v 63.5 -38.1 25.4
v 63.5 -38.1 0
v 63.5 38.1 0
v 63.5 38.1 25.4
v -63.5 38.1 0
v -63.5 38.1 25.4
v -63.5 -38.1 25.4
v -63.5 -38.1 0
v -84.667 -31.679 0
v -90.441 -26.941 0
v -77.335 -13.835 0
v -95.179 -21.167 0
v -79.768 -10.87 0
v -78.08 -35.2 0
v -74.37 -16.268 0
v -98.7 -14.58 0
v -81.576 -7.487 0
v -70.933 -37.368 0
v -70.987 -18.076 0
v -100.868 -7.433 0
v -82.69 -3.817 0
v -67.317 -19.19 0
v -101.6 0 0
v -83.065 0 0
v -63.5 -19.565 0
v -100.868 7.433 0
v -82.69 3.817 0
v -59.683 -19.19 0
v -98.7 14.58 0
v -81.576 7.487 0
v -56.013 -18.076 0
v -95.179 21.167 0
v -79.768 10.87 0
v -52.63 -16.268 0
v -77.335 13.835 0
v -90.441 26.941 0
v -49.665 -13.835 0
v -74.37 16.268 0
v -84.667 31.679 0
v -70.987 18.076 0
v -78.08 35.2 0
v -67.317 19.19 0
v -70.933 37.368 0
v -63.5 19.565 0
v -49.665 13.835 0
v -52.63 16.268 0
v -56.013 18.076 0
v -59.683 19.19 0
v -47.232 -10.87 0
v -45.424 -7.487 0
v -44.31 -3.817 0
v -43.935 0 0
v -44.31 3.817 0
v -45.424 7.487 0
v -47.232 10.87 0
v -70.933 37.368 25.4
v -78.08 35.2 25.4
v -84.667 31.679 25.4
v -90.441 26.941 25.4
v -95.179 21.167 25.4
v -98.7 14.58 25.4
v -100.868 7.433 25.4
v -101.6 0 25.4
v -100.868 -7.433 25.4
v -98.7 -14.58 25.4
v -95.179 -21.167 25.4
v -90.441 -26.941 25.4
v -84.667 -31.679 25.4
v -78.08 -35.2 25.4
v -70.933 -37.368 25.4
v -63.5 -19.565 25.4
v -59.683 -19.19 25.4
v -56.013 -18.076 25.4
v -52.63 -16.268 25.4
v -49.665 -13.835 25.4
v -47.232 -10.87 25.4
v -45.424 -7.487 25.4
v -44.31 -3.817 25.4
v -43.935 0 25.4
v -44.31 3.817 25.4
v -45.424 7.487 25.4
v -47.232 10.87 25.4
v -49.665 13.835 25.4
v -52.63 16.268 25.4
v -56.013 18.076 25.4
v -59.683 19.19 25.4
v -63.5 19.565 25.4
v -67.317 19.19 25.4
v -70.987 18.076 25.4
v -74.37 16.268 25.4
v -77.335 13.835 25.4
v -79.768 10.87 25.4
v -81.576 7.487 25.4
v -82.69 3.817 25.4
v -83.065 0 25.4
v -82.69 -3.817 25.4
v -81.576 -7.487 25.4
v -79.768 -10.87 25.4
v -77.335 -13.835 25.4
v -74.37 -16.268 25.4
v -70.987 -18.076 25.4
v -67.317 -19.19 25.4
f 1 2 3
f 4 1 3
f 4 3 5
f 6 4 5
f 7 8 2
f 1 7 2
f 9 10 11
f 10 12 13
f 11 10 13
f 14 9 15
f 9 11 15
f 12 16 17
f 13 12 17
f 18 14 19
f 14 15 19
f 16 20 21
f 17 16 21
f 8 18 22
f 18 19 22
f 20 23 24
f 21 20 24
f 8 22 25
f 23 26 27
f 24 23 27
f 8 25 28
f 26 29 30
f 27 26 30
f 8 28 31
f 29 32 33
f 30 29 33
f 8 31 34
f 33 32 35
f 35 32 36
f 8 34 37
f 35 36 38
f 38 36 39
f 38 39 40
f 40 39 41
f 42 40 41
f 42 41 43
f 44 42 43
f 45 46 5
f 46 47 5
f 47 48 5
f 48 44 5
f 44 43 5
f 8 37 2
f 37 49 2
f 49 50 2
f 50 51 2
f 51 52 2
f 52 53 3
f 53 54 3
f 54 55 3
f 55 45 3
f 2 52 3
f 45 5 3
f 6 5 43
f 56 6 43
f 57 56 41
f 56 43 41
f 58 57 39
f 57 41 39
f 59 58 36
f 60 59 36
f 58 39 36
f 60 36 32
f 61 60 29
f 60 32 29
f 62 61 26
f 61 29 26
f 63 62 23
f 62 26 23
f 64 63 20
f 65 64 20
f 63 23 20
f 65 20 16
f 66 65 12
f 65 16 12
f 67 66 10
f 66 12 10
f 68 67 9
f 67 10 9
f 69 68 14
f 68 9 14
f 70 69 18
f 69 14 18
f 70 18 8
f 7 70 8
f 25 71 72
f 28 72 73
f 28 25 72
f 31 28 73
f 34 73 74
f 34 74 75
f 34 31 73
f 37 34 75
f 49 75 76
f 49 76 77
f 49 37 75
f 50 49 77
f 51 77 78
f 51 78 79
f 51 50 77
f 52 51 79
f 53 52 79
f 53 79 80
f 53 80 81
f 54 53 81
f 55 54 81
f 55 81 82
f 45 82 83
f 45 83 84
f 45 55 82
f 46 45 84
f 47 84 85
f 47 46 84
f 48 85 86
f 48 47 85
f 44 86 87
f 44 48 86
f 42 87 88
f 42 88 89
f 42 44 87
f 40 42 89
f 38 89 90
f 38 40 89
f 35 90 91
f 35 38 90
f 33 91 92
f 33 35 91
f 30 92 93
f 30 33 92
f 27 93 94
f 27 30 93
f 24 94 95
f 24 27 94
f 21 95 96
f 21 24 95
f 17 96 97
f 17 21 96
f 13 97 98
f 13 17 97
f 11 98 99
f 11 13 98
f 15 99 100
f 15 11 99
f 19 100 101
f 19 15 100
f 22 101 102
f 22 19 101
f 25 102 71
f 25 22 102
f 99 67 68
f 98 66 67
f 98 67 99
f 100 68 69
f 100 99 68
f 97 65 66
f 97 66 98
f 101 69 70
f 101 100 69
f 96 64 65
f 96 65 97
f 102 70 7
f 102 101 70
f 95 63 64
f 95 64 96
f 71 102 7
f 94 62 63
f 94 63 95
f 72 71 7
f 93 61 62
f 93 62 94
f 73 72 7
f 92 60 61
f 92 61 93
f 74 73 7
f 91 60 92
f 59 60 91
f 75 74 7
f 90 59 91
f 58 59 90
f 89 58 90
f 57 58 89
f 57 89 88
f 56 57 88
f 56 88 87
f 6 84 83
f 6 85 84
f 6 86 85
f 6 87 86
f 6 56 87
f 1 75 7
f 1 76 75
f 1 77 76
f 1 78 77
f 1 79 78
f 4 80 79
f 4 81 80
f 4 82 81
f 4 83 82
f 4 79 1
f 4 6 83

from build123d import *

# Parameters (mm, degrees)
F1_DEPTH = 25.4
F2_DEPTH = 25.4
F3_DEPTH = 25.4


with BuildPart() as f1:
    # F0 (on Top) → F1 (new body)
    with BuildSketch(Plane.XY):
        with BuildLine():
            Line((-63.5, 19.565446079), (-63.5, -19.565446079))
            ThreePointArc((-63.5, -19.565446079), (-49.6651404006, -13.8348595994), (-43.934553921, 0))
            ThreePointArc((-43.934553921, 0), (-49.6651404006, 13.8348595994), (-63.5, 19.565446079))
        make_face()
        with BuildLine():
            ThreePointArc((-63.5, 19.565446079), (-83.065446079, 0), (-63.5, -19.565446079))
            Line((-63.5, -19.565446079), (-63.5, 19.565446079))
        make_face()
    extrude(amount=F1_DEPTH)

    # F0 (on Top) → F2 (join)
    with BuildSketch(Plane.XY):
        with BuildLine():
            Line((-63.5, -38.1), (63.5, -38.1))
            Line((63.5, -38.1), (63.5, 38.1))
            Line((63.5, 38.1), (-63.5, 38.1))
            ThreePointArc((-63.5, 38.1), (-36.5592316368, 26.9407683632), (-25.4, 0))
            ThreePointArc((-25.4, 0), (-36.5592316368, -26.9407683632), (-63.5, -38.1))
        make_face()
        with BuildLine():
            ThreePointArc((-63.5, 38.1), (-101.6, 0), (-63.5, -38.1))
            Line((-63.5, -38.1), (-63.5, -19.565446079))
            ThreePointArc((-63.5, -19.565446079), (-83.065446079, 0), (-63.5, 19.565446079))
            Line((-63.5, 19.565446079), (-63.5, 38.1))
        make_face()
        with BuildLine():
            Line((-63.5, -19.565446079), (-63.5, -38.1))
            ThreePointArc((-63.5, -38.1), (-36.5592316368, -26.9407683632), (-25.4, 0))
            ThreePointArc((-25.4, 0), (-36.5592316368, 26.9407683632), (-63.5, 38.1))
            Line((-63.5, 38.1), (-63.5, 19.565446079))
            ThreePointArc((-63.5, 19.565446079), (-49.6651404006, 13.8348595994), (-43.934553921, 0))
            ThreePointArc((-43.934553921, 0), (-49.6651404006, -13.8348595994), (-63.5, -19.565446079))
        make_face()
    extrude(amount=F2_DEPTH)

    # F0 (on Top) → F3 (cut)
    with BuildSketch(Plane.XY):
        with BuildLine():
            ThreePointArc((-63.5, 19.565446079), (-83.065446079, 0), (-63.5, -19.565446079))
            Line((-63.5, -19.565446079), (-63.5, 19.565446079))
        make_face()
        with BuildLine():
            Line((-63.5, 19.565446079), (-63.5, -19.565446079))
            ThreePointArc((-63.5, -19.565446079), (-49.6651404006, -13.8348595994), (-43.934553921, 0))
            ThreePointArc((-43.934553921, 0), (-49.6651404006, 13.8348595994), (-63.5, 19.565446079))
        make_face()
    extrude(amount=F3_DEPTH, mode=Mode.SUBTRACT)


solid = f1.part
